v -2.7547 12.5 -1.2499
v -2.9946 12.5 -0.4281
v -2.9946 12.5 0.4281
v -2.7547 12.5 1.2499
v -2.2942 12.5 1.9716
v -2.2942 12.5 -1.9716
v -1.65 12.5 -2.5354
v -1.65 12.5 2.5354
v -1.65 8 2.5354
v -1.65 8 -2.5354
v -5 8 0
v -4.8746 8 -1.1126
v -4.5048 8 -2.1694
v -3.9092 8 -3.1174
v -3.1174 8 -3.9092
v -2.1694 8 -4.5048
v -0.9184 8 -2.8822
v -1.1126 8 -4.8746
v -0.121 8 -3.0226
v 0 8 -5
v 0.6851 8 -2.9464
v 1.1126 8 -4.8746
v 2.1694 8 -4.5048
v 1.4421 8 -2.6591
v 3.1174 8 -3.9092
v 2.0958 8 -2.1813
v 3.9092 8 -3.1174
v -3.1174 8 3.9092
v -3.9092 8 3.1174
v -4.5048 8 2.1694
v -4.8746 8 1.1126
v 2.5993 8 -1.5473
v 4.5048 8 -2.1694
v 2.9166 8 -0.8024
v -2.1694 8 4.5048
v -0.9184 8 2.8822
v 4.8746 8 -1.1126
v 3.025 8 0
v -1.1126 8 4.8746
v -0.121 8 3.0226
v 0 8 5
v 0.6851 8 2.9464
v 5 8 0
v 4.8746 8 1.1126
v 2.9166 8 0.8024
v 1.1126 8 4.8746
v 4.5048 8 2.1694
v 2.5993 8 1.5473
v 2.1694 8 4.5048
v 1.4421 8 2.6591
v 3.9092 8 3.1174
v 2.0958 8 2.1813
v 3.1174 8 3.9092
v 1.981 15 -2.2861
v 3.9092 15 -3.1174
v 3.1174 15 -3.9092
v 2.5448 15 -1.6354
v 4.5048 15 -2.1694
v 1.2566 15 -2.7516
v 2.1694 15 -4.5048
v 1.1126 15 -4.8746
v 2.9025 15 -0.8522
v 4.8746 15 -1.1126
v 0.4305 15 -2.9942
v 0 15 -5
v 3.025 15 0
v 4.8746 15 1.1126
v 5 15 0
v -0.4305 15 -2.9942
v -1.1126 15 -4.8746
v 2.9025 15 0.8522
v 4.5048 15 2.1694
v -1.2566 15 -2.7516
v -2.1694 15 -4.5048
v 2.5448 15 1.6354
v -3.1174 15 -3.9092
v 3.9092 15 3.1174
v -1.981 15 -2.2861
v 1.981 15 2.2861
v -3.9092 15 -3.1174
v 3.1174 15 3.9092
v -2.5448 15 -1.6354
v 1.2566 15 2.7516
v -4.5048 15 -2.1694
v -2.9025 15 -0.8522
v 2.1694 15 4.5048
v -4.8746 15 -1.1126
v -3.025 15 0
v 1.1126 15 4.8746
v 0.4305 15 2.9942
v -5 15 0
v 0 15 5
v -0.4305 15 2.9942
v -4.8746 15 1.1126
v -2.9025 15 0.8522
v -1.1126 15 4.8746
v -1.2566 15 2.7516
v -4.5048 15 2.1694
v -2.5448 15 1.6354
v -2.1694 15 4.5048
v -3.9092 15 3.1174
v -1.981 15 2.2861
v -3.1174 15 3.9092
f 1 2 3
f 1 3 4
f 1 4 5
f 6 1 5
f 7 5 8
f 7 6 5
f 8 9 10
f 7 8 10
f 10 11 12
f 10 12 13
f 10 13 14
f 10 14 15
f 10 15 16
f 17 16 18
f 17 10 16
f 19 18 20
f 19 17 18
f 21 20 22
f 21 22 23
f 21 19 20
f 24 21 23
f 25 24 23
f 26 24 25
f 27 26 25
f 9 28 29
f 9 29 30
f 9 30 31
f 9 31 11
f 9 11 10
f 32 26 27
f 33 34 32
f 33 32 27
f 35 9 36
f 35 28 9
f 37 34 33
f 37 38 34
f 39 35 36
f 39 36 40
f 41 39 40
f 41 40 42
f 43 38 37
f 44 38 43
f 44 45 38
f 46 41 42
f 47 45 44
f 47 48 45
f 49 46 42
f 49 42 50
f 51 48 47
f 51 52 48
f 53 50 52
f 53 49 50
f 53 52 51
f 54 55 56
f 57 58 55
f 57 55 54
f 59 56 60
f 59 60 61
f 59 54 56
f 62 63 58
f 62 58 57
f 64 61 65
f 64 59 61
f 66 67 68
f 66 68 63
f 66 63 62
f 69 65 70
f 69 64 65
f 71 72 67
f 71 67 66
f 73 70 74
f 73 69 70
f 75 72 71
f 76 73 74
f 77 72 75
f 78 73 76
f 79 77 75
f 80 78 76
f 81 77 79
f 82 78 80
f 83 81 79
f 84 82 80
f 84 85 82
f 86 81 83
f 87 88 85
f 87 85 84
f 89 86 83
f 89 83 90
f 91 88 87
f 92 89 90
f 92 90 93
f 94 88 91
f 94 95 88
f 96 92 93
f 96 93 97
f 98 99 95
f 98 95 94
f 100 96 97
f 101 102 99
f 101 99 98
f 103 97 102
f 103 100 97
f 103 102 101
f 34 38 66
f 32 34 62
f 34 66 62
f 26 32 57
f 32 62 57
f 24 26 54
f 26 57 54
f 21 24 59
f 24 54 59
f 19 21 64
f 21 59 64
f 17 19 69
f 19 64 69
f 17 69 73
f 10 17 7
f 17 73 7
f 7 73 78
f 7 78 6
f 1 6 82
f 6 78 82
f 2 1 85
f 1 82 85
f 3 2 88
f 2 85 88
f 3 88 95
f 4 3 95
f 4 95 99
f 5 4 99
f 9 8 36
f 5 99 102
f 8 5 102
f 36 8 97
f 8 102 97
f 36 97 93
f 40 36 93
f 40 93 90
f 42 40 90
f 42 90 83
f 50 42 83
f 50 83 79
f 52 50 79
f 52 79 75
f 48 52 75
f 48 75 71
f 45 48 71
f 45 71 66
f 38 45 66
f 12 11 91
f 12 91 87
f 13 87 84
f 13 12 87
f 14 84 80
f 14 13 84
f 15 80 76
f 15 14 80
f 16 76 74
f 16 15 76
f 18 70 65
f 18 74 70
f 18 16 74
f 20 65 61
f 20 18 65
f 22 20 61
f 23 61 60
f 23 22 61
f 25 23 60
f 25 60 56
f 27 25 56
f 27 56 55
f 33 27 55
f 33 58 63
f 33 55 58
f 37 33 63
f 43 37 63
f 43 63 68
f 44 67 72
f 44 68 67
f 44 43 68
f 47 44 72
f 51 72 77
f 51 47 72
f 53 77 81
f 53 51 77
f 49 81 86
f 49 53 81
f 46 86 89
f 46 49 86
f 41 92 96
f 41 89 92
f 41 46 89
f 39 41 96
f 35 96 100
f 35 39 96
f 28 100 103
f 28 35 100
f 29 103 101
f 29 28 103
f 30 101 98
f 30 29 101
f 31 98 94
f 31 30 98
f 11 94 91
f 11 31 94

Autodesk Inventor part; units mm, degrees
ref_plane "YZ Plane" through (0, 0, 0) normal (1, 0, 0) x (0, 1, 0)
ref_plane "XZ Plane" through (0, 0, 0) normal (0, 1, 0) x (-1, 0, 0)
ref_plane "XY Plane" through (0, 0, 0) normal (0, 0, 1) x (1, 0, 0)
sketch "Sketch1" plane through (0, 0, 0) normal (0, 1, 0) x (-1, 0, 0)
  circle A0 centre (0, 0) radius 5
  dimension "d0" = 10
extrude "Extrusion1" add sketch "Sketch1" along normal blind 15
sketch "Sketch2" plane through (0, 15, 0) normal (0, 1, 0) x (1, 0, 0)
  circle A0 centre (0, 0) radius 3.025
  dimension "d3" = 6.05
extrude "Extrusion2" cut sketch "Sketch2" against normal blind 12.5
sketch "Sketch3" plane through (0, 2.5, 0) normal (0, 1, 0) x (1, 0, 0)
  circle A0 centre (0, 0) radius 3.025 construction
  line L0 (-1.65, -3.3431) -> (-1.65, 4.0859) construction
  arc A1 (-1.65, 2.5354) -> (-1.65, -2.5354) centre (0, 0) ccw
  line L1 (-1.65, -2.5354) -> (-1.65, 2.5354)
  dimension "d6" = 1.65
extrude "Extrusion3" add sketch "Sketch3" along normal blind 10
sketch "Sketch4" plane through (0, 0, 0) normal (0, -1, 0) x (1, 0, 0)
  circle A0 centre (0, 0) radius 5 projected
extrude "Extrusion4" cut sketch "Sketch4" against normal blind 8
properties part number "test_axis"
